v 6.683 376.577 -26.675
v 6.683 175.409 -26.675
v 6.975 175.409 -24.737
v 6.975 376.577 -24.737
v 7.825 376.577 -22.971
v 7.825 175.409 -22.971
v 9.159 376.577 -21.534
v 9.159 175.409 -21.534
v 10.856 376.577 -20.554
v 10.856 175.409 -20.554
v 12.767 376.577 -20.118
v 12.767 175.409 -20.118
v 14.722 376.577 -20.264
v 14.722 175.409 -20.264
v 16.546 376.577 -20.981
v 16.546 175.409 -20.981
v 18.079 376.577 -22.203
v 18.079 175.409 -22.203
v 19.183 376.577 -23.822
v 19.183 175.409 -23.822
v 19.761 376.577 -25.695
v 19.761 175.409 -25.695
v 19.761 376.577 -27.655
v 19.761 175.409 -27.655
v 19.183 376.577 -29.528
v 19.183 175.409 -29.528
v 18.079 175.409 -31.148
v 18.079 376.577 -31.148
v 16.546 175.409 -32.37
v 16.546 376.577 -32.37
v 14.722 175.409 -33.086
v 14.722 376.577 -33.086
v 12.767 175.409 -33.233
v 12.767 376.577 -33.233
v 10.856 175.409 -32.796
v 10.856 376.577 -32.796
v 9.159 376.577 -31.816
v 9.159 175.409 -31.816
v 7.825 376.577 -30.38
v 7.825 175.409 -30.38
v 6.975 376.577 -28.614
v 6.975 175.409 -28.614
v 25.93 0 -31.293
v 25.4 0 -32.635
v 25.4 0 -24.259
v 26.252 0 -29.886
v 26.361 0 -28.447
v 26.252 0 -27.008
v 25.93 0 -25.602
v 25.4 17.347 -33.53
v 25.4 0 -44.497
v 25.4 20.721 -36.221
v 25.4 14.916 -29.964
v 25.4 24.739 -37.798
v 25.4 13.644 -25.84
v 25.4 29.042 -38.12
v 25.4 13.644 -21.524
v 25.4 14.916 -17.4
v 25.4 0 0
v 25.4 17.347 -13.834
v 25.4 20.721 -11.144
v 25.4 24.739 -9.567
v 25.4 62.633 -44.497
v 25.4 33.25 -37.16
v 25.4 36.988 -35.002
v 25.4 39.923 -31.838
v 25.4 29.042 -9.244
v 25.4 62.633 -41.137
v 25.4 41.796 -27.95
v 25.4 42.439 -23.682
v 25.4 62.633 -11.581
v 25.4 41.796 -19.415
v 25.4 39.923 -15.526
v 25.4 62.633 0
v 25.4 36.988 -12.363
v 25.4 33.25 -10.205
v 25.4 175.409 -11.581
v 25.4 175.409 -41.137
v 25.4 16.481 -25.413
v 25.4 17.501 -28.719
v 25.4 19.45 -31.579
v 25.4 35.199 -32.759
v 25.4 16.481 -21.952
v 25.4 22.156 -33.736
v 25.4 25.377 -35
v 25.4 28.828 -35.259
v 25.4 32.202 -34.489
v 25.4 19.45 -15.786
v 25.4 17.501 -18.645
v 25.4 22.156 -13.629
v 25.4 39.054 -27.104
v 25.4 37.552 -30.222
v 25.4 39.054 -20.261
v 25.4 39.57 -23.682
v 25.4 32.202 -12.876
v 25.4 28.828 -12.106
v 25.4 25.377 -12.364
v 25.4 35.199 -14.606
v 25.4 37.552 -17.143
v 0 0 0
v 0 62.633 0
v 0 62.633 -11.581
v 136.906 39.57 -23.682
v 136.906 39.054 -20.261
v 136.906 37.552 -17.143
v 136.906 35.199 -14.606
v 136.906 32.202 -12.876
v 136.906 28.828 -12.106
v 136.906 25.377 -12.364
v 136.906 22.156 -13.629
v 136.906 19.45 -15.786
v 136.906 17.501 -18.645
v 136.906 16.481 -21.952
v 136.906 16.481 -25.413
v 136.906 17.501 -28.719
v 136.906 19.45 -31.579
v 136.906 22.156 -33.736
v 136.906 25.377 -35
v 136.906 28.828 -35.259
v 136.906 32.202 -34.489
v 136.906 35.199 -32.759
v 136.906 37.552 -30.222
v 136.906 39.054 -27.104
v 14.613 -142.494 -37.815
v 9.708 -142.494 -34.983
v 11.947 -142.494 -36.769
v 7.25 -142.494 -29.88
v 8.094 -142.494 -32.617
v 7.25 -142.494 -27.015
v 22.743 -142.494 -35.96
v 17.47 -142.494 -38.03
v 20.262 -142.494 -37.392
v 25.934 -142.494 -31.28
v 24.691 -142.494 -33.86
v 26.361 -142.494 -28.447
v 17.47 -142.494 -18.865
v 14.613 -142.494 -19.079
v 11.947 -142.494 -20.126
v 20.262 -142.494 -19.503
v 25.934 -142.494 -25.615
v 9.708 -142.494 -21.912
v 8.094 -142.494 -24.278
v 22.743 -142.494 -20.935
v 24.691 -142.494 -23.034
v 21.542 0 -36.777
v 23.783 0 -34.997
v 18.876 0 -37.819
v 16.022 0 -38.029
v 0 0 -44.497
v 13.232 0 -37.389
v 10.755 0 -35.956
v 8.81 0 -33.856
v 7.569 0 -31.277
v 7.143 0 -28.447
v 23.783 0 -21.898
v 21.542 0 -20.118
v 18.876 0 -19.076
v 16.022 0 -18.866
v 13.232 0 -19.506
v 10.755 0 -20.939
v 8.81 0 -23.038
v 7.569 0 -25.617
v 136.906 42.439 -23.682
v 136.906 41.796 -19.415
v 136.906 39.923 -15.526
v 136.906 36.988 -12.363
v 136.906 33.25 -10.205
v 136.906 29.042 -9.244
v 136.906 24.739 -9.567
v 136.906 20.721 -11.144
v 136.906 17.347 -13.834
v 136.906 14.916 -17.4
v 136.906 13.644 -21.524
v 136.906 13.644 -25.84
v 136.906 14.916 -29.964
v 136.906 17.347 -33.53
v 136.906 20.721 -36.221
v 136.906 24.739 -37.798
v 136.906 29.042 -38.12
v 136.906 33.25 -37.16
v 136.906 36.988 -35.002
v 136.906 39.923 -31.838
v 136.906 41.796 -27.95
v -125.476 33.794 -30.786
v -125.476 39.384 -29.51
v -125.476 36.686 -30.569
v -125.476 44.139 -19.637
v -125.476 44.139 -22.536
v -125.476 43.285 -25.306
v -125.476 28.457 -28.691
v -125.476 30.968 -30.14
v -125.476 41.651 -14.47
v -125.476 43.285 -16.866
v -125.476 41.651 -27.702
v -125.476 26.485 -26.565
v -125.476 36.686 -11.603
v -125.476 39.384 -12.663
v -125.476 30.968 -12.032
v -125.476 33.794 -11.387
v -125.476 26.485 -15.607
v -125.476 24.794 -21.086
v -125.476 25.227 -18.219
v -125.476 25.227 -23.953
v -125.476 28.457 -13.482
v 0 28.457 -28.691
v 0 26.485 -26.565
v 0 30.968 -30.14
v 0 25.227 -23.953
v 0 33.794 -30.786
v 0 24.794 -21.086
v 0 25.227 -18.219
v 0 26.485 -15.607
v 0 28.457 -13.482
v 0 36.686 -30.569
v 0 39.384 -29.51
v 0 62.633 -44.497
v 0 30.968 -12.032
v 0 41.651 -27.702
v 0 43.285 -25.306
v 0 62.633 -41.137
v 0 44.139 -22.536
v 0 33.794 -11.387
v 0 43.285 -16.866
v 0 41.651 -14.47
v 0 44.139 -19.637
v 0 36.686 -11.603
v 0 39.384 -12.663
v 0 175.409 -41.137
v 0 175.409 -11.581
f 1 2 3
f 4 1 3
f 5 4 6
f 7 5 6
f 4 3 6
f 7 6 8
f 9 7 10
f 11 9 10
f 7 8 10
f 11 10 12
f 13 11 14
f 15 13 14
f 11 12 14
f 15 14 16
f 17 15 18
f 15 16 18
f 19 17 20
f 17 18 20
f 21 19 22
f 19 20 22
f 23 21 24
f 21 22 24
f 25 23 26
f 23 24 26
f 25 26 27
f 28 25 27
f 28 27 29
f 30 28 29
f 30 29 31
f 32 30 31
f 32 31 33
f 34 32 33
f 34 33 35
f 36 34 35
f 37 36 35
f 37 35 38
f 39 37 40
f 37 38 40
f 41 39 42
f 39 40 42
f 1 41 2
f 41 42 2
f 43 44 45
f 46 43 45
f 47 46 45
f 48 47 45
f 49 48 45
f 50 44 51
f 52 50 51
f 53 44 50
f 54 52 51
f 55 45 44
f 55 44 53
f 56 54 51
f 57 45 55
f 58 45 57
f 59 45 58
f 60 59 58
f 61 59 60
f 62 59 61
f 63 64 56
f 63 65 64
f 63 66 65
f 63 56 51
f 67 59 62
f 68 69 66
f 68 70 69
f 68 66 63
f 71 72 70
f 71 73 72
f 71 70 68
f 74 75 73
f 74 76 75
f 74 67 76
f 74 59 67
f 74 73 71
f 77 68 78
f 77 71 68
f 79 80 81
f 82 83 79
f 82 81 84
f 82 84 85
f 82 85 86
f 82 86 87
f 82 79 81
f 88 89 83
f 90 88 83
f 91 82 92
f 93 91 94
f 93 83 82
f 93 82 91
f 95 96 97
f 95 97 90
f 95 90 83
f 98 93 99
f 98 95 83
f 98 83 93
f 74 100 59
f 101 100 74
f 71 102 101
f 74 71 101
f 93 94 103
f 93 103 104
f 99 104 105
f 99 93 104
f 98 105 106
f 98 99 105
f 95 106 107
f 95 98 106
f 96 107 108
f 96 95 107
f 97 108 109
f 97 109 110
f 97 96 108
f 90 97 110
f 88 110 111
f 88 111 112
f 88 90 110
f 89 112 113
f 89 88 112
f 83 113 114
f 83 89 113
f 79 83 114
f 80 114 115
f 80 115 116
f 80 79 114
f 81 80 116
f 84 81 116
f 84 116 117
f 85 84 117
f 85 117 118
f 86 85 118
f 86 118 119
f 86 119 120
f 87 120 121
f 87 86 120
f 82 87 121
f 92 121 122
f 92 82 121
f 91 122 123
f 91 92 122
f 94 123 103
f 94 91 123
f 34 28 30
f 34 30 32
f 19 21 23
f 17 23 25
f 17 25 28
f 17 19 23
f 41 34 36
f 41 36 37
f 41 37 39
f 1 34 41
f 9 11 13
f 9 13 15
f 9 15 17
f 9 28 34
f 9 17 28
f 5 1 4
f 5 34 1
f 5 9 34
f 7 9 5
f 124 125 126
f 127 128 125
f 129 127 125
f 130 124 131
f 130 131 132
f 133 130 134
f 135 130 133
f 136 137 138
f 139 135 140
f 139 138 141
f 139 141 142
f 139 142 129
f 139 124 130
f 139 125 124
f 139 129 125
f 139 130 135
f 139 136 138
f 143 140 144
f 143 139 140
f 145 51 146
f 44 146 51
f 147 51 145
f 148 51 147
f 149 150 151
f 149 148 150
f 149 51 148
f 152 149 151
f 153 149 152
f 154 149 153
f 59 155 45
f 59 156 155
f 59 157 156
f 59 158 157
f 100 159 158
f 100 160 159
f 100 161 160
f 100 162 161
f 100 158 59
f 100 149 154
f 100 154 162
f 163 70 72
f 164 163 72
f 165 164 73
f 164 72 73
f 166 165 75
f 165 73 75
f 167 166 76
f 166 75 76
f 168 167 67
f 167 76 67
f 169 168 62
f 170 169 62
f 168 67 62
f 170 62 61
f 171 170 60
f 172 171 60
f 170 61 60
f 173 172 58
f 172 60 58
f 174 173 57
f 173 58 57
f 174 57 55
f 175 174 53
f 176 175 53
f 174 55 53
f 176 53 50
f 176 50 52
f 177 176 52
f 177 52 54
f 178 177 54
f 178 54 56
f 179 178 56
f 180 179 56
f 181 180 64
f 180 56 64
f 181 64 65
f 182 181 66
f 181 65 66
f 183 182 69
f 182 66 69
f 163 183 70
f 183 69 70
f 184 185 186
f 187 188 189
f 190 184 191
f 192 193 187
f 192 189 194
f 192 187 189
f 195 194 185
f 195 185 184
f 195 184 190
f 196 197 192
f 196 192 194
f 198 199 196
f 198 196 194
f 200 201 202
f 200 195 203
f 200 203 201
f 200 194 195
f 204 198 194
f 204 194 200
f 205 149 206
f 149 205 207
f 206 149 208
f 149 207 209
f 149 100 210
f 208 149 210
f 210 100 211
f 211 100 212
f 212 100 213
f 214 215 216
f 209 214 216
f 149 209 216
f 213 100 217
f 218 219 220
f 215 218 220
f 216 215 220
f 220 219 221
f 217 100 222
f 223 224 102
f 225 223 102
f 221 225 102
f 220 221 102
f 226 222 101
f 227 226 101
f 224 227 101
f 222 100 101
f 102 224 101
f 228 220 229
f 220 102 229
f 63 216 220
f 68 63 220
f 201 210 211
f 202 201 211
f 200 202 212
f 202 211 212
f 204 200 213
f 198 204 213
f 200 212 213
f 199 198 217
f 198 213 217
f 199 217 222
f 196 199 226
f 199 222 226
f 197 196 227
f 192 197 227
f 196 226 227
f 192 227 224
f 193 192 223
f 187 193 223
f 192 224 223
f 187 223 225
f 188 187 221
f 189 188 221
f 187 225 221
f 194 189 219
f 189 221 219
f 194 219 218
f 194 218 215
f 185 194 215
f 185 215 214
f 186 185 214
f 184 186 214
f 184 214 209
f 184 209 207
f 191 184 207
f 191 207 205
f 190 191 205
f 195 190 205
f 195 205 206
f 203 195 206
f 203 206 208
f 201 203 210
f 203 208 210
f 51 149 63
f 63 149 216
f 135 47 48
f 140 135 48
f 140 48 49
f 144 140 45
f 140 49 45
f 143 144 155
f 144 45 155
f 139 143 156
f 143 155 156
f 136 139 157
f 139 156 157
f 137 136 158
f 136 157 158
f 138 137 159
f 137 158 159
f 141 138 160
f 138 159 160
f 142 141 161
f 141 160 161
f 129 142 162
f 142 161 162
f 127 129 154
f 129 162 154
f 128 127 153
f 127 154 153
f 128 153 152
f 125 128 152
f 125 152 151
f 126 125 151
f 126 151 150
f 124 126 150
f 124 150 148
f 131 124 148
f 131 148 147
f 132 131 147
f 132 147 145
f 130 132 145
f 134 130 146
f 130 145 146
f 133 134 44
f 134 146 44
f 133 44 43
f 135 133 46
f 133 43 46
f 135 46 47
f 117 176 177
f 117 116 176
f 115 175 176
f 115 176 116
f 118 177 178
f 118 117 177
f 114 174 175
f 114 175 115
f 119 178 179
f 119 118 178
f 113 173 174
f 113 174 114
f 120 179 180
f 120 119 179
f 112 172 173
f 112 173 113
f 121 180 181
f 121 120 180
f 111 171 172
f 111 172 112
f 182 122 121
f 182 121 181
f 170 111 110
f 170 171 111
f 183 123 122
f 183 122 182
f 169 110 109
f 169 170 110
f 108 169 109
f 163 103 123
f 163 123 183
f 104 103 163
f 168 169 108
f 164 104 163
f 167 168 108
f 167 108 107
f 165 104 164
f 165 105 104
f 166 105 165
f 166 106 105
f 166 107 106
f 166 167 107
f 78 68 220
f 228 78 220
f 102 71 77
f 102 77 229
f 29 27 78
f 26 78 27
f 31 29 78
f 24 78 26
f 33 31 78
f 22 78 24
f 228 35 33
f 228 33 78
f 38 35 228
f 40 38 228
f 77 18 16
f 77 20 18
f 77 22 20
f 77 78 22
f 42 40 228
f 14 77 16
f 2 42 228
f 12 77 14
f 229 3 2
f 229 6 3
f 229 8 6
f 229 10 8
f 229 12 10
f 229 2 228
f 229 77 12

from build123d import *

# Parameters (mm, degrees)
F0_W      = 62.632754
F0_H      = 44.497188
F1_DEPTH  = 25.4
F2_R      = 9.609065
F3_DEPTH  = 142.494
F4_R      = 14.478505
F4_R_2    = 11.60909
F5_DEPTH  = 111.506
F6_R      = 9.726664
F7_DEPTH  = 125.476
F8_W      = 25.4
F8_H      = 29.555707
F9_DEPTH  = 112.776
F10_R     = 6.575743
F11_DEPTH = 201.168


with BuildPart() as f1:
    # F0 (on Right) → F1 (new body)
    with BuildSketch(Plane.YZ):
        with Locations((31.316377, -22.248594)):
            Rectangle(F0_W, F0_H)
    extrude(amount=F1_DEPTH)

    # F2 (on face) → F3 (join)
    with BuildSketch(Plane.XZ):
        with Locations((16.751623, -28.44735)):
            Circle(F2_R)
    extrude(amount=F3_DEPTH)

    # F4 (on face) → F5 (join)
    with BuildSketch(Plane.YZ.offset(25.4)):
        with Locations((27.960511, -23.682347)):
            Circle(F4_R)
        with Locations((27.960511, -23.682347)):
            Circle(F4_R_2, mode=Mode.SUBTRACT)
    extrude(amount=F5_DEPTH)

    # F6 (on face) → F7 (join)
    with BuildSketch(Plane(origin=(0, 0, 0), x_dir=(0, -1, 0), z_dir=(-1, 0, 0))):
        with Locations((-34.521122, -21.086203)):
            Circle(F6_R)
    extrude(amount=F7_DEPTH)

    # F8 (on face) → F9 (join)
    with BuildSketch(Plane(origin=(0, 62.632754, 0), x_dir=(-1, 0, 0), z_dir=(0, 1, 0))):
        with Locations((-12.7, -26.358702)):
            Rectangle(F8_W, F8_H)
    extrude(amount=F9_DEPTH)

    # F10 (on face) → F11 (join)
    with BuildSketch(Plane(origin=(0, 175.408754, 0), x_dir=(-1, 0, 0), z_dir=(0, 1, 0))):
        with Locations((-13.258439, -26.675297)):
            Circle(F10_R)
    extrude(amount=F11_DEPTH)


solid = f1.part
